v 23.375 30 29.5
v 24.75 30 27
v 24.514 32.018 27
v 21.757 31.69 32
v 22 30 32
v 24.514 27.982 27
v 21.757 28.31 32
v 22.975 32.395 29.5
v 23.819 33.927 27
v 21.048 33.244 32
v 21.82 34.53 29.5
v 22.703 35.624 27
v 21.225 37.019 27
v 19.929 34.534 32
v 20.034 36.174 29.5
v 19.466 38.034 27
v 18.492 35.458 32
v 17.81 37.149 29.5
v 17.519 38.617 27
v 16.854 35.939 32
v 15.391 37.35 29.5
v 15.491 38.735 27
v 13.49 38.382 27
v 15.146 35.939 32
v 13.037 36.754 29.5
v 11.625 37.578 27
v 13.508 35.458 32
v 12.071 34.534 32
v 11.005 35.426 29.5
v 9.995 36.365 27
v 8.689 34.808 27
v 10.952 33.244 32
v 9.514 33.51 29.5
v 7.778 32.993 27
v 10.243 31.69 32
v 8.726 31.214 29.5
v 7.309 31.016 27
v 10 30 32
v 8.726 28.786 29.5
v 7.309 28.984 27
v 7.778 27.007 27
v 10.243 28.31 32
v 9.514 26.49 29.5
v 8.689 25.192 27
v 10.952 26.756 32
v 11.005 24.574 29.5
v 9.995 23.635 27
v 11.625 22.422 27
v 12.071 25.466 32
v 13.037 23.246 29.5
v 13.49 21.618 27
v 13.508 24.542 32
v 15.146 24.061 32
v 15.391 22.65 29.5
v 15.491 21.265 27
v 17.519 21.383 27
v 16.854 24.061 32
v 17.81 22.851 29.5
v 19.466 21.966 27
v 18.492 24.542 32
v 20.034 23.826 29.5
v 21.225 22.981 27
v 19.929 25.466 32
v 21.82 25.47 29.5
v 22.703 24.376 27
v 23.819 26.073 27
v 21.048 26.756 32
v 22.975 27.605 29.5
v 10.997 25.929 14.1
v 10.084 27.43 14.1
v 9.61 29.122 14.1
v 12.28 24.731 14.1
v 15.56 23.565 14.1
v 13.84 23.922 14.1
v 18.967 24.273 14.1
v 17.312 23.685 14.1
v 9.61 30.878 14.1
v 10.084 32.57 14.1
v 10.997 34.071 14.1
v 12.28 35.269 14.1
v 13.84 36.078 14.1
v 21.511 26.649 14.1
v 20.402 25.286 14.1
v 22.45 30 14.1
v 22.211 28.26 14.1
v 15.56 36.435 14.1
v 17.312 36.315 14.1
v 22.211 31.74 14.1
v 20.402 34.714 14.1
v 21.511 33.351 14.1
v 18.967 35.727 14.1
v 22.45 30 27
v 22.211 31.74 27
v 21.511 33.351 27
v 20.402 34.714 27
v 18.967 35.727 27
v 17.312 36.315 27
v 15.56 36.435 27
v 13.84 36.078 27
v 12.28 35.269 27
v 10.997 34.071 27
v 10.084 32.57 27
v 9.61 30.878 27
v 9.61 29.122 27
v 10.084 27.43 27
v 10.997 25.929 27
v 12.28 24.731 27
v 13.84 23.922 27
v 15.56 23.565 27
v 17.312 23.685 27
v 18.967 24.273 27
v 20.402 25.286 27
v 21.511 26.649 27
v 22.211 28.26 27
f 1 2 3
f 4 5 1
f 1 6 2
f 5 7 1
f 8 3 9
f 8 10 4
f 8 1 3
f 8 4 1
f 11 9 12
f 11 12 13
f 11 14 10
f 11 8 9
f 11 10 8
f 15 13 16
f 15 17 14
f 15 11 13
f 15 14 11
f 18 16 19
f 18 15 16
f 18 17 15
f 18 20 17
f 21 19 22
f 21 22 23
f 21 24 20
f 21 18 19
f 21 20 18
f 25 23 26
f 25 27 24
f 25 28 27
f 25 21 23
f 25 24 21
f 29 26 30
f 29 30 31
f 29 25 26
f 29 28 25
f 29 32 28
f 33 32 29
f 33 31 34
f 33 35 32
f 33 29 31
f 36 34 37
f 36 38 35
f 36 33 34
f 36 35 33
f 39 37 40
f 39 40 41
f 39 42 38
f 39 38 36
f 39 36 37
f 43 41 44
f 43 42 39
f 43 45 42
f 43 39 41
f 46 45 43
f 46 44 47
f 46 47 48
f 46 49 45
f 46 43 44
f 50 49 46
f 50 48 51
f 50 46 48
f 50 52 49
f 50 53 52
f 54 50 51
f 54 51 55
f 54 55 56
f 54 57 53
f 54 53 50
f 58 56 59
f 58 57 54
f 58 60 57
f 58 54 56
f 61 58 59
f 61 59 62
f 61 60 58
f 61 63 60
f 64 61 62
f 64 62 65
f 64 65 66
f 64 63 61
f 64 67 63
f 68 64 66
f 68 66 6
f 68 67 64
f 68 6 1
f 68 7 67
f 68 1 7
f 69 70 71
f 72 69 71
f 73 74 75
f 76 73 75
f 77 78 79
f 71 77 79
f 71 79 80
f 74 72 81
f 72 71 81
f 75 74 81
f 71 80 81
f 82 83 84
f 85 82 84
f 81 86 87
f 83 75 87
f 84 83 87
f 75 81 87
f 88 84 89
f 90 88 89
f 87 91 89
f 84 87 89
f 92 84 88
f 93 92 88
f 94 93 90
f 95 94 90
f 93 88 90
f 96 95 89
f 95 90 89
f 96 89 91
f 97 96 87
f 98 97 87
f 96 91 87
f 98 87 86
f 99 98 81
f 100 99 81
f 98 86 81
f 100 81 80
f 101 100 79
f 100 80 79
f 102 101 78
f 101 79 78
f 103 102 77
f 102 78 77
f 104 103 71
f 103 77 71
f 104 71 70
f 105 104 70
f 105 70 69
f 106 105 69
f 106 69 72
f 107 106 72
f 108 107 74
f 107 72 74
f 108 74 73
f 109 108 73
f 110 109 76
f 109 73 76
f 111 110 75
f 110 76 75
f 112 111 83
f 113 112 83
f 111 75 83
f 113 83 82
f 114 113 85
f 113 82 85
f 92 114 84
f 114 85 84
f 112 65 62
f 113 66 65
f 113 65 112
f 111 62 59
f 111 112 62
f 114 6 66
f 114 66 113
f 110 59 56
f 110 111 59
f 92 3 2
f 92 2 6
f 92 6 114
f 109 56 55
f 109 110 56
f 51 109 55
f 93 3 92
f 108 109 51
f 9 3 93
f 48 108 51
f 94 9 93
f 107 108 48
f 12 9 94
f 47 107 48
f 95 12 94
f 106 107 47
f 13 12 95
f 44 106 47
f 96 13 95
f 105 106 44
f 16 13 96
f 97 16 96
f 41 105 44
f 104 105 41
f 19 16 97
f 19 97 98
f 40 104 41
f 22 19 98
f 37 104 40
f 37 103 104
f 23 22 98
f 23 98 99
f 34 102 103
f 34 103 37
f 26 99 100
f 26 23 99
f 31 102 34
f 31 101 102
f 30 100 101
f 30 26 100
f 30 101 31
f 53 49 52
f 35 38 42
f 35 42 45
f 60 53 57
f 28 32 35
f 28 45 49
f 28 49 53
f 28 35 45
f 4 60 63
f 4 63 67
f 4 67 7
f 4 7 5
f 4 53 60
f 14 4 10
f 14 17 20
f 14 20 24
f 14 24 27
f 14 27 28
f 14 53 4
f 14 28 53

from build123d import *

# Parameters (mm, degrees)
CYLINDER_R     = 6.45
CYLINDER_DEPTH = 12.9


with BuildPart() as cone:
    # Cone → Cone (revolve)
    with BuildSketch(Plane.XZ):
        Polygon((0, 0), (8.75, 0), (6, 5), (0, 5), align=None)
    revolve(axis=Axis((0, 0, 0), (0, 0, 1)))


with BuildPart() as button:
    # Cylinder → Cylinder (new body)
    with BuildSketch(Plane.XY.offset(-12.9)):
        Circle(CYLINDER_R)
    extrude(amount=CYLINDER_DEPTH)

    # Fusion: union Cone
    add(cone.part)


with BuildPart() as button_1:
    # Fusion placement: moved
    add(button.part.moved(Location((16, 30, 27))))


solid = button_1.part
